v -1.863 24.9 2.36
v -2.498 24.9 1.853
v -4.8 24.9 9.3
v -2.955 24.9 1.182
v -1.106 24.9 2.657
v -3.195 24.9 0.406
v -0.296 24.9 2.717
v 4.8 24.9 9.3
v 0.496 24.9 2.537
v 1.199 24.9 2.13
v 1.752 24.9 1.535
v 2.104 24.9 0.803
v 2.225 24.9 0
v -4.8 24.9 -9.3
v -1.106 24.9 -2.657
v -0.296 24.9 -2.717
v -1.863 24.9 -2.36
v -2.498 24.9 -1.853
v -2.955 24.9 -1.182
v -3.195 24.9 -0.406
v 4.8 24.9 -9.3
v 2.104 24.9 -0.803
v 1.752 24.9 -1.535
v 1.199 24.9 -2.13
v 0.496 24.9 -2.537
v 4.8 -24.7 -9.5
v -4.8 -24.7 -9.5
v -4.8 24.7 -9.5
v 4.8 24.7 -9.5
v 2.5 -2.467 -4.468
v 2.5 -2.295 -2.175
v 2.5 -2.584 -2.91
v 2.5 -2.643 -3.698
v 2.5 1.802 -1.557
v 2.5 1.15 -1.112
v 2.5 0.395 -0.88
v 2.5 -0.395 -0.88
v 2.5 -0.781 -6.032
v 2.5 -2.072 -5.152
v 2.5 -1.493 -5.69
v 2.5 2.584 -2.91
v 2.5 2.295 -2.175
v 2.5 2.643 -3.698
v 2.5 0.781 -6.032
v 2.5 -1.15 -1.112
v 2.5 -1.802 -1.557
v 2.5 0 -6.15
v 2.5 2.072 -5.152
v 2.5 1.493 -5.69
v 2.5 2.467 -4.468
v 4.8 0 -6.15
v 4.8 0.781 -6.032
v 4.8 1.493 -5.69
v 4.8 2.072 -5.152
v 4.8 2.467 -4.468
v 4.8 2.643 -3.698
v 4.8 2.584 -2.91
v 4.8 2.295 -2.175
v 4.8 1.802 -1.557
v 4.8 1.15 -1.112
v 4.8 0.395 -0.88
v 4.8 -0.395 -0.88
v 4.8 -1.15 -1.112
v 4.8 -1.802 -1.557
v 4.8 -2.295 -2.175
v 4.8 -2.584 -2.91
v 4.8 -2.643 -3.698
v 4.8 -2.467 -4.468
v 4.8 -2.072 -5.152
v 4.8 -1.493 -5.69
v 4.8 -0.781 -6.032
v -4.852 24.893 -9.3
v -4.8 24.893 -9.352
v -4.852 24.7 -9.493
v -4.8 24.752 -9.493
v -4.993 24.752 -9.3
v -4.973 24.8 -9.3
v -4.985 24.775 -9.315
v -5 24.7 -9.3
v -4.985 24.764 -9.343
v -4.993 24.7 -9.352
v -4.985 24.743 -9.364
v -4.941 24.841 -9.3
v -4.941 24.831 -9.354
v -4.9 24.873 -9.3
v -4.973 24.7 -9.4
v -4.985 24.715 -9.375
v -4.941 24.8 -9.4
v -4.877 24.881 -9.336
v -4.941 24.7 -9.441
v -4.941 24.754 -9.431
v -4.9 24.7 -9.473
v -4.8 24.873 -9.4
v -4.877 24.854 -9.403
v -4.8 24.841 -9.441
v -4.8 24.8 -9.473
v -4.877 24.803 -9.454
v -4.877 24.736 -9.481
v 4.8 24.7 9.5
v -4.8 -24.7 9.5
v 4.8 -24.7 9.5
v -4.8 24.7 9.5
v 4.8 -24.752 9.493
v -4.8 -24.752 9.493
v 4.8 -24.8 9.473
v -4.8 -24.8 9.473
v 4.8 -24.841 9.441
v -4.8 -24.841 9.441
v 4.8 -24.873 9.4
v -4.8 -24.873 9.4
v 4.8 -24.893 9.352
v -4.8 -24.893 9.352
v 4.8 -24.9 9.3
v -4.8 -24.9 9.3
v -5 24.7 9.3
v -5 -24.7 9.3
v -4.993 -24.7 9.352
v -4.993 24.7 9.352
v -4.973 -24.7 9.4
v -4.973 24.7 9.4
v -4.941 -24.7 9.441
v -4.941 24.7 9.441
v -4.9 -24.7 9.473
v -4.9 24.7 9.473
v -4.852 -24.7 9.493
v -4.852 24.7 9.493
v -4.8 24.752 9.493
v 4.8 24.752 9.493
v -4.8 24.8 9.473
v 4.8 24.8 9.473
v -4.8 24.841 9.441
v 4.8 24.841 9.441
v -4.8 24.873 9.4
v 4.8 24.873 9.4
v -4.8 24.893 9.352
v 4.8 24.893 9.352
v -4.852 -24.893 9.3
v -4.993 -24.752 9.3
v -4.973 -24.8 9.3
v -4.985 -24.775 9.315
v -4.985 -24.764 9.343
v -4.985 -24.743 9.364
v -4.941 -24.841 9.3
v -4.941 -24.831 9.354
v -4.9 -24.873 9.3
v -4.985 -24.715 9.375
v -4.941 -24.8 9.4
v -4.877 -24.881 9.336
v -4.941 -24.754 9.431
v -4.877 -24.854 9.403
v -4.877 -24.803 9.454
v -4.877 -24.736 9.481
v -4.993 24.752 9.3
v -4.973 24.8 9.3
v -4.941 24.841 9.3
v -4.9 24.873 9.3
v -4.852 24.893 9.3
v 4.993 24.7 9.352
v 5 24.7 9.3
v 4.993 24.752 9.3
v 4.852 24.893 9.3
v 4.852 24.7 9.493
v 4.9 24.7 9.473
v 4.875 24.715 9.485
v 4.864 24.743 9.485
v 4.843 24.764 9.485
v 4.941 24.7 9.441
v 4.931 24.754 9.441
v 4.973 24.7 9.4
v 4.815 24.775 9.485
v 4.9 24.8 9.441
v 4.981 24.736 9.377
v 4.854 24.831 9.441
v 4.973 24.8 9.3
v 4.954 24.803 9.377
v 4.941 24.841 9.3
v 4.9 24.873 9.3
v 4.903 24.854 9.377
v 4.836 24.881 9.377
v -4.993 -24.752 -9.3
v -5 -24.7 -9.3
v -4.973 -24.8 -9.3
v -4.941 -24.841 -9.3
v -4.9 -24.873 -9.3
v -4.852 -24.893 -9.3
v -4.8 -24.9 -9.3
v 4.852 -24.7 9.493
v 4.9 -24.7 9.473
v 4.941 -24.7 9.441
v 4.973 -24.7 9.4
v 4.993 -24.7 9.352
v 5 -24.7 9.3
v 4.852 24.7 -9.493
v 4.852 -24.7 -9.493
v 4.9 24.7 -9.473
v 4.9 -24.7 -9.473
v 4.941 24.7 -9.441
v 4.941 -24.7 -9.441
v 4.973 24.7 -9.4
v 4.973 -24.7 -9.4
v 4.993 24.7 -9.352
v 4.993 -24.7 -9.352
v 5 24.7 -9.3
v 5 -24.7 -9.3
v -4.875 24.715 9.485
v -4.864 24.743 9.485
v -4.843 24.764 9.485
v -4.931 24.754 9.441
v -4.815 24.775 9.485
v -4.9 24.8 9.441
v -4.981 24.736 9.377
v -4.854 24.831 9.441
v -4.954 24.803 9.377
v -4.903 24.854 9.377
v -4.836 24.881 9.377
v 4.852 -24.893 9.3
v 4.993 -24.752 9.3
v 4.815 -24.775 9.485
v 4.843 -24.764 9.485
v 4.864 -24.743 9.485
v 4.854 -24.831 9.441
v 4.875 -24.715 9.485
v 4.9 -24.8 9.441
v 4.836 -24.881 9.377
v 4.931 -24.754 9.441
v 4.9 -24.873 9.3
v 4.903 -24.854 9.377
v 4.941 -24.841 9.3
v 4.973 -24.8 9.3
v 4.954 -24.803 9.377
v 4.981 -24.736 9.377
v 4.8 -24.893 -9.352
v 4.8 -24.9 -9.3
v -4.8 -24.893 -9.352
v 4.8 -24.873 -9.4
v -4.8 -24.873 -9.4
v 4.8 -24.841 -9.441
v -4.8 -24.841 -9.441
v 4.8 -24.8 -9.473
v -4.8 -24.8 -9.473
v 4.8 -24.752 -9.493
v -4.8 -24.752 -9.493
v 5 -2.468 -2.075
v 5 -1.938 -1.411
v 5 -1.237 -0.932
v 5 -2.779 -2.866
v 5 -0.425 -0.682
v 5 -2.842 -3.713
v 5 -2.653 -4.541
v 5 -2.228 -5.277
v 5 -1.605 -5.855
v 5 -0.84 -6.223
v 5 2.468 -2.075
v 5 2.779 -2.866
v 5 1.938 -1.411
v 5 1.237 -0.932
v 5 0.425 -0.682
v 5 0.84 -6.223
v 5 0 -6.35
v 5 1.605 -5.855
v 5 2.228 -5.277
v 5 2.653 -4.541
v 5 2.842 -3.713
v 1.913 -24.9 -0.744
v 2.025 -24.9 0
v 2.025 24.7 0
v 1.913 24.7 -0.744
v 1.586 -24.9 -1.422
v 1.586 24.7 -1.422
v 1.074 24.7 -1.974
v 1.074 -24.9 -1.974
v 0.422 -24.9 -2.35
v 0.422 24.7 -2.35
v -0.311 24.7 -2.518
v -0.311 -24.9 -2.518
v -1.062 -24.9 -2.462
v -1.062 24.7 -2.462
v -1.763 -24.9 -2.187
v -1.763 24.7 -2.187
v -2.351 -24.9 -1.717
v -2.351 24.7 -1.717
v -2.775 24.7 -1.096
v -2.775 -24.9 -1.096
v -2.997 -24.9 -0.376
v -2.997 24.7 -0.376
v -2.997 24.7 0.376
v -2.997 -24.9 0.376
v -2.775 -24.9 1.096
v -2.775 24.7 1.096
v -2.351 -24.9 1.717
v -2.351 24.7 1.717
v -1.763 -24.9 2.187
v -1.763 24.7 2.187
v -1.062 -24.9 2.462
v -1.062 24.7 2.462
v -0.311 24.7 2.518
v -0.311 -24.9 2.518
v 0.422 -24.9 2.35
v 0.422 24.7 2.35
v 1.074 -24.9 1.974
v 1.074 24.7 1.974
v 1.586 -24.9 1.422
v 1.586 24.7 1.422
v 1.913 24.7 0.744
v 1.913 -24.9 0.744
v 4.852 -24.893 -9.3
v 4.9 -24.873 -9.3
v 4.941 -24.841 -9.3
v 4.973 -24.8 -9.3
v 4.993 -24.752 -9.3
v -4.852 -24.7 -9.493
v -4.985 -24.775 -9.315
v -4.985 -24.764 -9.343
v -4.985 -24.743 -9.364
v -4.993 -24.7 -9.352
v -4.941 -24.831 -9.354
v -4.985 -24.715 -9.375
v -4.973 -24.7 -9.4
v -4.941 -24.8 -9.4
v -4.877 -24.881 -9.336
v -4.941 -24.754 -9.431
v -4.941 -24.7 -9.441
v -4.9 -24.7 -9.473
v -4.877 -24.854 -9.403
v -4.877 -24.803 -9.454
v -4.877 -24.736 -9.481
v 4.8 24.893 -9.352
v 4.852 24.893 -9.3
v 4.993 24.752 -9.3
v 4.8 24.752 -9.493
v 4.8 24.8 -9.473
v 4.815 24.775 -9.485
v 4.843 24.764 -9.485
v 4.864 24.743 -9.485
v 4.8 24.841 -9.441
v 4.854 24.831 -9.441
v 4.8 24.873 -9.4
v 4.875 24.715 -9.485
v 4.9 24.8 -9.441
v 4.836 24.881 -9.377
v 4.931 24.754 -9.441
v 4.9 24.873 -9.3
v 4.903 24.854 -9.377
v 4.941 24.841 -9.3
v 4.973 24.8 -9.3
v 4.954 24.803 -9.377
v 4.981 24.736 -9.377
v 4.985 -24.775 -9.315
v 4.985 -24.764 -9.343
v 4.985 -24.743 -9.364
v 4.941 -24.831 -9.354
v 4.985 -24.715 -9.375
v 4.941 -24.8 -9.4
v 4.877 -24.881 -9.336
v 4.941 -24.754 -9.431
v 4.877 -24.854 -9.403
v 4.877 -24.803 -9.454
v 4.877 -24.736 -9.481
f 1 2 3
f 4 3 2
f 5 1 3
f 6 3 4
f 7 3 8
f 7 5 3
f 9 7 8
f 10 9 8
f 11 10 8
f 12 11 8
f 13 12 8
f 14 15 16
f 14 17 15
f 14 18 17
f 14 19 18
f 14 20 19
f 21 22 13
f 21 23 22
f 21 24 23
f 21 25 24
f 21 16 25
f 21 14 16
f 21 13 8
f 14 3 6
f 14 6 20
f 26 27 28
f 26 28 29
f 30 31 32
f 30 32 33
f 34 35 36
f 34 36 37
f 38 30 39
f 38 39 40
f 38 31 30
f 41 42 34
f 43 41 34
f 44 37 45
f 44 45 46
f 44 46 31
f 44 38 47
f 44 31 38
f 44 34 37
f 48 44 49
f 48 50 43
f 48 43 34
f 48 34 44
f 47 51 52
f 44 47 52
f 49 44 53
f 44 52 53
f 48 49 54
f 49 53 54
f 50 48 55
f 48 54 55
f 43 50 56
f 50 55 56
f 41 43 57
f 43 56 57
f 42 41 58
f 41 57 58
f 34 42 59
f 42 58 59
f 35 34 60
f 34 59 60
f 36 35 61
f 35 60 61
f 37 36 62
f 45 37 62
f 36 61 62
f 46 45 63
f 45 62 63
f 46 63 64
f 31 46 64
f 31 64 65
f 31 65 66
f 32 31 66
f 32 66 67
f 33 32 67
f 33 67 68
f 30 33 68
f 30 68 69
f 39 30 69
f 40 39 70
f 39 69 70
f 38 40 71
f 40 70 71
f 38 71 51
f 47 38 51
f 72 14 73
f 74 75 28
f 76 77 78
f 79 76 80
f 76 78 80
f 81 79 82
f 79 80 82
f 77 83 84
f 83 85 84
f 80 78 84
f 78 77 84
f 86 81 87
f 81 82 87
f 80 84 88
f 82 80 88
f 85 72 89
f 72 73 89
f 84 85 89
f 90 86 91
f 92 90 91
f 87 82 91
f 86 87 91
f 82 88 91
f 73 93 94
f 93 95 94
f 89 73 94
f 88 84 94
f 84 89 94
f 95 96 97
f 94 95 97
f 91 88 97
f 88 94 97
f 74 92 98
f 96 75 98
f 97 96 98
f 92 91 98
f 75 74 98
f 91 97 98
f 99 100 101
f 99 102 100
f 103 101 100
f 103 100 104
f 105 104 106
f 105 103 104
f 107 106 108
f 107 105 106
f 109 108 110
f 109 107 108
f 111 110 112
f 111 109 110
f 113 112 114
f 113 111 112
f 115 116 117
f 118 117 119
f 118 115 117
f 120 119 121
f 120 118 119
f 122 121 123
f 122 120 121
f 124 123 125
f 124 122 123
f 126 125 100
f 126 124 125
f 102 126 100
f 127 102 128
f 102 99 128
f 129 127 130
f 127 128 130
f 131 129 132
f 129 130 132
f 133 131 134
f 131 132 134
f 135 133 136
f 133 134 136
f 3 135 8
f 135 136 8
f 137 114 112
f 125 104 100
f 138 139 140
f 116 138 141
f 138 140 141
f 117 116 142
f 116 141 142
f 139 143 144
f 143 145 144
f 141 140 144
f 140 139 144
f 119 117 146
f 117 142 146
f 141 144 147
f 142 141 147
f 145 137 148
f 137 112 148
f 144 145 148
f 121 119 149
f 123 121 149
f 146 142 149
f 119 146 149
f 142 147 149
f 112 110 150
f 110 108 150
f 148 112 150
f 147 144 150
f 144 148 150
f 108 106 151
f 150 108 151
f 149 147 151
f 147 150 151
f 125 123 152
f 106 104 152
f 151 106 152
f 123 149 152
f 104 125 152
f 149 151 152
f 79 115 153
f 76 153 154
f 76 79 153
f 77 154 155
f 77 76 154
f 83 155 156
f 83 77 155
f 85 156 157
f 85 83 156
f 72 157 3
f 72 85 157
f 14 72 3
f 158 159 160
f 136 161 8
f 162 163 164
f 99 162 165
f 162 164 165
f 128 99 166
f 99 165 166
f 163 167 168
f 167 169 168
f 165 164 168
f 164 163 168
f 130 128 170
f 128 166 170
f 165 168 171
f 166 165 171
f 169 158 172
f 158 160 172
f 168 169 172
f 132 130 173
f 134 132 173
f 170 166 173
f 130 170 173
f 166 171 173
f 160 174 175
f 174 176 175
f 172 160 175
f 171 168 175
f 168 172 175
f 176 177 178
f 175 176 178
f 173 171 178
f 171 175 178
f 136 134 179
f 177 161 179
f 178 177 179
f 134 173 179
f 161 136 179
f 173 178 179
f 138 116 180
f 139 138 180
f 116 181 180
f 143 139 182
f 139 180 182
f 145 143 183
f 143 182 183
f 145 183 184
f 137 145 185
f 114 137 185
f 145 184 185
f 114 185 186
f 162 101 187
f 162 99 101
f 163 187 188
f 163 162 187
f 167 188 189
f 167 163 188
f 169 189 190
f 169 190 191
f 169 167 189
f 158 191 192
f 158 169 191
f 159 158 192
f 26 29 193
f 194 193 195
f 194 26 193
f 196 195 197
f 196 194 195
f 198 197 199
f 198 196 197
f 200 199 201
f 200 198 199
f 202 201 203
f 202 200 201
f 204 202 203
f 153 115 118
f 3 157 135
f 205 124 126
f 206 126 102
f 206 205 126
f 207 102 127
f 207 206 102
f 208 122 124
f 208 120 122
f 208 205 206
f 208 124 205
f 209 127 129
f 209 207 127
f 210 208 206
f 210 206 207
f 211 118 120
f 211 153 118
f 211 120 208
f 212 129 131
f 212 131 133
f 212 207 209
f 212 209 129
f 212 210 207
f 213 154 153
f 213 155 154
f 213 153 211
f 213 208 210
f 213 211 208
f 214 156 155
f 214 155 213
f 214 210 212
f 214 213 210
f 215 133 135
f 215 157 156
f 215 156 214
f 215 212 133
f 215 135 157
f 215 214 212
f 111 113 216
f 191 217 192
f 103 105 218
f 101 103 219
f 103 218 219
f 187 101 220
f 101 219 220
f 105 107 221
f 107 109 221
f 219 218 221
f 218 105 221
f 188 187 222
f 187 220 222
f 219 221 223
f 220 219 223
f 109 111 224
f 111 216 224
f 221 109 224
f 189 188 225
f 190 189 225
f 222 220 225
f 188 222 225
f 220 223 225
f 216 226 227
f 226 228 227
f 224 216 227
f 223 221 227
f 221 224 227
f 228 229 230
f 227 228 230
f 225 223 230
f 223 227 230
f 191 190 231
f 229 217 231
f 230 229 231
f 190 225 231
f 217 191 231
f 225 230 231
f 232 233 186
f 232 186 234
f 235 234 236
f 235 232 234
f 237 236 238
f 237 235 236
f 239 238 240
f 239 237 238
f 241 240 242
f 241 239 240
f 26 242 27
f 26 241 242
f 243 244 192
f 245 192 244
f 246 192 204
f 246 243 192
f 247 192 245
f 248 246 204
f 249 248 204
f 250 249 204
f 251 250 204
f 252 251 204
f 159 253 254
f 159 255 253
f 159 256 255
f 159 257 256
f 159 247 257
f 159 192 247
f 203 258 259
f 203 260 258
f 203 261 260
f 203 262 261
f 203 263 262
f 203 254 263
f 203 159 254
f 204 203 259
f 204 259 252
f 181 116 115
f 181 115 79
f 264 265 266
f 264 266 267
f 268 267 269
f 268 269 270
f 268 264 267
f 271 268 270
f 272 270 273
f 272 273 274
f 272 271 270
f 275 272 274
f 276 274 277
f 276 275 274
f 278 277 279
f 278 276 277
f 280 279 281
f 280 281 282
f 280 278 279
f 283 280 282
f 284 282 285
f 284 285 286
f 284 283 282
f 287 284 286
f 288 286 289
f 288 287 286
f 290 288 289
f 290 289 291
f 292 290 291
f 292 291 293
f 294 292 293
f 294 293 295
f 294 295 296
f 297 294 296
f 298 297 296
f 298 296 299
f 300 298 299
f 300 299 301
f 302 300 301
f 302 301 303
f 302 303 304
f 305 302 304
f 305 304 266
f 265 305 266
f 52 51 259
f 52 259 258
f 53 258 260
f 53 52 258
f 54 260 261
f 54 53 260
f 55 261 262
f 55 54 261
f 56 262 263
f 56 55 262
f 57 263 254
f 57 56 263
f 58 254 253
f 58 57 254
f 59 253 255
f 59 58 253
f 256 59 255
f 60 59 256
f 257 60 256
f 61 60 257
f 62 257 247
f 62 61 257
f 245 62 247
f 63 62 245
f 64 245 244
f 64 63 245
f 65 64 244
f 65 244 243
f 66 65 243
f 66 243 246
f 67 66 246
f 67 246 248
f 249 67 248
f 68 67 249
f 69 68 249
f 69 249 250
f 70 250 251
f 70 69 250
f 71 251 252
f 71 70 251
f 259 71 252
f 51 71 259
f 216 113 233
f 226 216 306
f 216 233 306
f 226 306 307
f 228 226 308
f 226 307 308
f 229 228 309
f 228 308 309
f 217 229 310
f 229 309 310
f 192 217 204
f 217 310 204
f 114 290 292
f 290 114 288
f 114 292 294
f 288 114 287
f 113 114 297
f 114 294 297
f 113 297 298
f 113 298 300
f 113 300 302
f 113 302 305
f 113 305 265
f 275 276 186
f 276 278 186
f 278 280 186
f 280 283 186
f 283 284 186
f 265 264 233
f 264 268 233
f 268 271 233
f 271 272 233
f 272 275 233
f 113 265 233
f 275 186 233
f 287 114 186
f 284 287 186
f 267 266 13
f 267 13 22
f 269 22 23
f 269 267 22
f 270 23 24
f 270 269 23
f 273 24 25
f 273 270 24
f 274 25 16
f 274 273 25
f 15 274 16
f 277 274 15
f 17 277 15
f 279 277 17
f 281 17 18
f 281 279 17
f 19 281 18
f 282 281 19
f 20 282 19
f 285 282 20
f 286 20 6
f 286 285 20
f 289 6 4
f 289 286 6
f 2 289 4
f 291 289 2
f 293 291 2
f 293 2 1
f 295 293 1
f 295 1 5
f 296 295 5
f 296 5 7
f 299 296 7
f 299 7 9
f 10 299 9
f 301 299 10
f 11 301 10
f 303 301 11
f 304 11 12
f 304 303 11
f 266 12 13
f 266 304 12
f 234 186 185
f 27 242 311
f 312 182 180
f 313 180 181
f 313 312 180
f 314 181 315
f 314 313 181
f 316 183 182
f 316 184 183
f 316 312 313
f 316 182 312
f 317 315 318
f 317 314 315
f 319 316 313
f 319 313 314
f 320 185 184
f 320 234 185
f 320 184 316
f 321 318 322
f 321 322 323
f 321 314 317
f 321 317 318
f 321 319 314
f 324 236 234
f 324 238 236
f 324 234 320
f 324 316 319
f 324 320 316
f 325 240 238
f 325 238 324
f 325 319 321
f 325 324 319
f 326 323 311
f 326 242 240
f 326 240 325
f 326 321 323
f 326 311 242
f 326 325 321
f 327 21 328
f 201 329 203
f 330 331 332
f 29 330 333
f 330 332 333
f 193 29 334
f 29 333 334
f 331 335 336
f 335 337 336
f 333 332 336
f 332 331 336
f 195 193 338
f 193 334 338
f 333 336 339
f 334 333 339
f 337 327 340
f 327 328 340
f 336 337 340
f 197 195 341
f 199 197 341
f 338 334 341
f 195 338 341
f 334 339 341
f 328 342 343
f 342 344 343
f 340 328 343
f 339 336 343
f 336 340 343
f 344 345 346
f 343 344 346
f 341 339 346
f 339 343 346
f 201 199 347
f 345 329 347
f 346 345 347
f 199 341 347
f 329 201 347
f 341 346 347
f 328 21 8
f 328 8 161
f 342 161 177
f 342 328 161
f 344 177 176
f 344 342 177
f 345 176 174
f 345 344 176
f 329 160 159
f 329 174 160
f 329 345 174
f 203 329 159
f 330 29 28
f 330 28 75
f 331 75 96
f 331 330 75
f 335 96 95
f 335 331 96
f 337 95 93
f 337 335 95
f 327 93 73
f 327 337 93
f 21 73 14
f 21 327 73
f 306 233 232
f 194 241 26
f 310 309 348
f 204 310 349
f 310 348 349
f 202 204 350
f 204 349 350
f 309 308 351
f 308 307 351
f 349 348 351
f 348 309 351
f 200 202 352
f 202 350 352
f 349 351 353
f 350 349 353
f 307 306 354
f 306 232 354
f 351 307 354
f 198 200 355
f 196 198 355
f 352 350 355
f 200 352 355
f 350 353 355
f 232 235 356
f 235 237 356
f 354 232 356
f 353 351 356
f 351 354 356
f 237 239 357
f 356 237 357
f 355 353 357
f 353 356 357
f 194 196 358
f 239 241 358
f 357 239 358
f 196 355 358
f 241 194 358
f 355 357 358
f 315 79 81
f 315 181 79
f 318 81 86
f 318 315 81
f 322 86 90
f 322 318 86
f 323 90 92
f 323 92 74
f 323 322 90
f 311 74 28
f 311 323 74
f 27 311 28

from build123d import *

# Parameters (mm, degrees)
SKETCH1_W           = 10
SKETCH1_H           = 19
SKETCH1_R           = 2.525
BOSS_EXTRUDE1_DEPTH = 24.9
SKETCH2_R           = 2.65
CUT_EXTRUDE1_DEPTH  = 2.5
FILLET1_R           = 0.2
CHAMFER1_SIZE       = 0.2


with BuildPart() as part:
    # Sketch1 → Boss-Extrude1 (new body, symmetric)
    with BuildSketch(Plane(origin=(0, 0, 0), x_dir=(1, 0, 0), z_dir=(0, 1, 0))):
        Rectangle(SKETCH1_W, SKETCH1_H)
        with Locations((-0.5, 0)):
            Circle(SKETCH1_R, mode=Mode.SUBTRACT)
    extrude(amount=BOSS_EXTRUDE1_DEPTH, both=True)

    # Sketch2 → Cut-Extrude1 (cut)
    with BuildSketch(Plane(origin=(5, 0, 0), x_dir=(0, 0, -1), z_dir=(1, 0, 0))):
        with Locations((3.5, 0)):
            Circle(SKETCH2_R)
    extrude(amount=-CUT_EXTRUDE1_DEPTH, mode=Mode.SUBTRACT)

    # Fillet1
    fillet1_edges = [part.edges().sort_by_distance(p)[0] for p in [
        (5, 24.9, 0),
        (0, 24.9, -9.5),
        (-5, 24.9, 0),
        (0, -24.9, -9.5),
        (5, -24.9, 0),
        (0, -24.9, 9.5),
        (-5, -24.9, 0),
        (-5, 0, -9.5),
        (5, 0, -9.5),
        (5, 0, 9.5),
        (-5, 0, 9.5),
        (0, 24.9, 9.5),
    ]]
    fillet(fillet1_edges, radius=FILLET1_R)

    # Chamfer1
    chamfer1_edges = [part.edges().sort_by_distance(p)[0] for p in [
        (-3.025, 24.9, 0),
        (5, 0, -0.85),
    ]]
    chamfer(chamfer1_edges, length=CHAMFER1_SIZE)


solid = part.part
